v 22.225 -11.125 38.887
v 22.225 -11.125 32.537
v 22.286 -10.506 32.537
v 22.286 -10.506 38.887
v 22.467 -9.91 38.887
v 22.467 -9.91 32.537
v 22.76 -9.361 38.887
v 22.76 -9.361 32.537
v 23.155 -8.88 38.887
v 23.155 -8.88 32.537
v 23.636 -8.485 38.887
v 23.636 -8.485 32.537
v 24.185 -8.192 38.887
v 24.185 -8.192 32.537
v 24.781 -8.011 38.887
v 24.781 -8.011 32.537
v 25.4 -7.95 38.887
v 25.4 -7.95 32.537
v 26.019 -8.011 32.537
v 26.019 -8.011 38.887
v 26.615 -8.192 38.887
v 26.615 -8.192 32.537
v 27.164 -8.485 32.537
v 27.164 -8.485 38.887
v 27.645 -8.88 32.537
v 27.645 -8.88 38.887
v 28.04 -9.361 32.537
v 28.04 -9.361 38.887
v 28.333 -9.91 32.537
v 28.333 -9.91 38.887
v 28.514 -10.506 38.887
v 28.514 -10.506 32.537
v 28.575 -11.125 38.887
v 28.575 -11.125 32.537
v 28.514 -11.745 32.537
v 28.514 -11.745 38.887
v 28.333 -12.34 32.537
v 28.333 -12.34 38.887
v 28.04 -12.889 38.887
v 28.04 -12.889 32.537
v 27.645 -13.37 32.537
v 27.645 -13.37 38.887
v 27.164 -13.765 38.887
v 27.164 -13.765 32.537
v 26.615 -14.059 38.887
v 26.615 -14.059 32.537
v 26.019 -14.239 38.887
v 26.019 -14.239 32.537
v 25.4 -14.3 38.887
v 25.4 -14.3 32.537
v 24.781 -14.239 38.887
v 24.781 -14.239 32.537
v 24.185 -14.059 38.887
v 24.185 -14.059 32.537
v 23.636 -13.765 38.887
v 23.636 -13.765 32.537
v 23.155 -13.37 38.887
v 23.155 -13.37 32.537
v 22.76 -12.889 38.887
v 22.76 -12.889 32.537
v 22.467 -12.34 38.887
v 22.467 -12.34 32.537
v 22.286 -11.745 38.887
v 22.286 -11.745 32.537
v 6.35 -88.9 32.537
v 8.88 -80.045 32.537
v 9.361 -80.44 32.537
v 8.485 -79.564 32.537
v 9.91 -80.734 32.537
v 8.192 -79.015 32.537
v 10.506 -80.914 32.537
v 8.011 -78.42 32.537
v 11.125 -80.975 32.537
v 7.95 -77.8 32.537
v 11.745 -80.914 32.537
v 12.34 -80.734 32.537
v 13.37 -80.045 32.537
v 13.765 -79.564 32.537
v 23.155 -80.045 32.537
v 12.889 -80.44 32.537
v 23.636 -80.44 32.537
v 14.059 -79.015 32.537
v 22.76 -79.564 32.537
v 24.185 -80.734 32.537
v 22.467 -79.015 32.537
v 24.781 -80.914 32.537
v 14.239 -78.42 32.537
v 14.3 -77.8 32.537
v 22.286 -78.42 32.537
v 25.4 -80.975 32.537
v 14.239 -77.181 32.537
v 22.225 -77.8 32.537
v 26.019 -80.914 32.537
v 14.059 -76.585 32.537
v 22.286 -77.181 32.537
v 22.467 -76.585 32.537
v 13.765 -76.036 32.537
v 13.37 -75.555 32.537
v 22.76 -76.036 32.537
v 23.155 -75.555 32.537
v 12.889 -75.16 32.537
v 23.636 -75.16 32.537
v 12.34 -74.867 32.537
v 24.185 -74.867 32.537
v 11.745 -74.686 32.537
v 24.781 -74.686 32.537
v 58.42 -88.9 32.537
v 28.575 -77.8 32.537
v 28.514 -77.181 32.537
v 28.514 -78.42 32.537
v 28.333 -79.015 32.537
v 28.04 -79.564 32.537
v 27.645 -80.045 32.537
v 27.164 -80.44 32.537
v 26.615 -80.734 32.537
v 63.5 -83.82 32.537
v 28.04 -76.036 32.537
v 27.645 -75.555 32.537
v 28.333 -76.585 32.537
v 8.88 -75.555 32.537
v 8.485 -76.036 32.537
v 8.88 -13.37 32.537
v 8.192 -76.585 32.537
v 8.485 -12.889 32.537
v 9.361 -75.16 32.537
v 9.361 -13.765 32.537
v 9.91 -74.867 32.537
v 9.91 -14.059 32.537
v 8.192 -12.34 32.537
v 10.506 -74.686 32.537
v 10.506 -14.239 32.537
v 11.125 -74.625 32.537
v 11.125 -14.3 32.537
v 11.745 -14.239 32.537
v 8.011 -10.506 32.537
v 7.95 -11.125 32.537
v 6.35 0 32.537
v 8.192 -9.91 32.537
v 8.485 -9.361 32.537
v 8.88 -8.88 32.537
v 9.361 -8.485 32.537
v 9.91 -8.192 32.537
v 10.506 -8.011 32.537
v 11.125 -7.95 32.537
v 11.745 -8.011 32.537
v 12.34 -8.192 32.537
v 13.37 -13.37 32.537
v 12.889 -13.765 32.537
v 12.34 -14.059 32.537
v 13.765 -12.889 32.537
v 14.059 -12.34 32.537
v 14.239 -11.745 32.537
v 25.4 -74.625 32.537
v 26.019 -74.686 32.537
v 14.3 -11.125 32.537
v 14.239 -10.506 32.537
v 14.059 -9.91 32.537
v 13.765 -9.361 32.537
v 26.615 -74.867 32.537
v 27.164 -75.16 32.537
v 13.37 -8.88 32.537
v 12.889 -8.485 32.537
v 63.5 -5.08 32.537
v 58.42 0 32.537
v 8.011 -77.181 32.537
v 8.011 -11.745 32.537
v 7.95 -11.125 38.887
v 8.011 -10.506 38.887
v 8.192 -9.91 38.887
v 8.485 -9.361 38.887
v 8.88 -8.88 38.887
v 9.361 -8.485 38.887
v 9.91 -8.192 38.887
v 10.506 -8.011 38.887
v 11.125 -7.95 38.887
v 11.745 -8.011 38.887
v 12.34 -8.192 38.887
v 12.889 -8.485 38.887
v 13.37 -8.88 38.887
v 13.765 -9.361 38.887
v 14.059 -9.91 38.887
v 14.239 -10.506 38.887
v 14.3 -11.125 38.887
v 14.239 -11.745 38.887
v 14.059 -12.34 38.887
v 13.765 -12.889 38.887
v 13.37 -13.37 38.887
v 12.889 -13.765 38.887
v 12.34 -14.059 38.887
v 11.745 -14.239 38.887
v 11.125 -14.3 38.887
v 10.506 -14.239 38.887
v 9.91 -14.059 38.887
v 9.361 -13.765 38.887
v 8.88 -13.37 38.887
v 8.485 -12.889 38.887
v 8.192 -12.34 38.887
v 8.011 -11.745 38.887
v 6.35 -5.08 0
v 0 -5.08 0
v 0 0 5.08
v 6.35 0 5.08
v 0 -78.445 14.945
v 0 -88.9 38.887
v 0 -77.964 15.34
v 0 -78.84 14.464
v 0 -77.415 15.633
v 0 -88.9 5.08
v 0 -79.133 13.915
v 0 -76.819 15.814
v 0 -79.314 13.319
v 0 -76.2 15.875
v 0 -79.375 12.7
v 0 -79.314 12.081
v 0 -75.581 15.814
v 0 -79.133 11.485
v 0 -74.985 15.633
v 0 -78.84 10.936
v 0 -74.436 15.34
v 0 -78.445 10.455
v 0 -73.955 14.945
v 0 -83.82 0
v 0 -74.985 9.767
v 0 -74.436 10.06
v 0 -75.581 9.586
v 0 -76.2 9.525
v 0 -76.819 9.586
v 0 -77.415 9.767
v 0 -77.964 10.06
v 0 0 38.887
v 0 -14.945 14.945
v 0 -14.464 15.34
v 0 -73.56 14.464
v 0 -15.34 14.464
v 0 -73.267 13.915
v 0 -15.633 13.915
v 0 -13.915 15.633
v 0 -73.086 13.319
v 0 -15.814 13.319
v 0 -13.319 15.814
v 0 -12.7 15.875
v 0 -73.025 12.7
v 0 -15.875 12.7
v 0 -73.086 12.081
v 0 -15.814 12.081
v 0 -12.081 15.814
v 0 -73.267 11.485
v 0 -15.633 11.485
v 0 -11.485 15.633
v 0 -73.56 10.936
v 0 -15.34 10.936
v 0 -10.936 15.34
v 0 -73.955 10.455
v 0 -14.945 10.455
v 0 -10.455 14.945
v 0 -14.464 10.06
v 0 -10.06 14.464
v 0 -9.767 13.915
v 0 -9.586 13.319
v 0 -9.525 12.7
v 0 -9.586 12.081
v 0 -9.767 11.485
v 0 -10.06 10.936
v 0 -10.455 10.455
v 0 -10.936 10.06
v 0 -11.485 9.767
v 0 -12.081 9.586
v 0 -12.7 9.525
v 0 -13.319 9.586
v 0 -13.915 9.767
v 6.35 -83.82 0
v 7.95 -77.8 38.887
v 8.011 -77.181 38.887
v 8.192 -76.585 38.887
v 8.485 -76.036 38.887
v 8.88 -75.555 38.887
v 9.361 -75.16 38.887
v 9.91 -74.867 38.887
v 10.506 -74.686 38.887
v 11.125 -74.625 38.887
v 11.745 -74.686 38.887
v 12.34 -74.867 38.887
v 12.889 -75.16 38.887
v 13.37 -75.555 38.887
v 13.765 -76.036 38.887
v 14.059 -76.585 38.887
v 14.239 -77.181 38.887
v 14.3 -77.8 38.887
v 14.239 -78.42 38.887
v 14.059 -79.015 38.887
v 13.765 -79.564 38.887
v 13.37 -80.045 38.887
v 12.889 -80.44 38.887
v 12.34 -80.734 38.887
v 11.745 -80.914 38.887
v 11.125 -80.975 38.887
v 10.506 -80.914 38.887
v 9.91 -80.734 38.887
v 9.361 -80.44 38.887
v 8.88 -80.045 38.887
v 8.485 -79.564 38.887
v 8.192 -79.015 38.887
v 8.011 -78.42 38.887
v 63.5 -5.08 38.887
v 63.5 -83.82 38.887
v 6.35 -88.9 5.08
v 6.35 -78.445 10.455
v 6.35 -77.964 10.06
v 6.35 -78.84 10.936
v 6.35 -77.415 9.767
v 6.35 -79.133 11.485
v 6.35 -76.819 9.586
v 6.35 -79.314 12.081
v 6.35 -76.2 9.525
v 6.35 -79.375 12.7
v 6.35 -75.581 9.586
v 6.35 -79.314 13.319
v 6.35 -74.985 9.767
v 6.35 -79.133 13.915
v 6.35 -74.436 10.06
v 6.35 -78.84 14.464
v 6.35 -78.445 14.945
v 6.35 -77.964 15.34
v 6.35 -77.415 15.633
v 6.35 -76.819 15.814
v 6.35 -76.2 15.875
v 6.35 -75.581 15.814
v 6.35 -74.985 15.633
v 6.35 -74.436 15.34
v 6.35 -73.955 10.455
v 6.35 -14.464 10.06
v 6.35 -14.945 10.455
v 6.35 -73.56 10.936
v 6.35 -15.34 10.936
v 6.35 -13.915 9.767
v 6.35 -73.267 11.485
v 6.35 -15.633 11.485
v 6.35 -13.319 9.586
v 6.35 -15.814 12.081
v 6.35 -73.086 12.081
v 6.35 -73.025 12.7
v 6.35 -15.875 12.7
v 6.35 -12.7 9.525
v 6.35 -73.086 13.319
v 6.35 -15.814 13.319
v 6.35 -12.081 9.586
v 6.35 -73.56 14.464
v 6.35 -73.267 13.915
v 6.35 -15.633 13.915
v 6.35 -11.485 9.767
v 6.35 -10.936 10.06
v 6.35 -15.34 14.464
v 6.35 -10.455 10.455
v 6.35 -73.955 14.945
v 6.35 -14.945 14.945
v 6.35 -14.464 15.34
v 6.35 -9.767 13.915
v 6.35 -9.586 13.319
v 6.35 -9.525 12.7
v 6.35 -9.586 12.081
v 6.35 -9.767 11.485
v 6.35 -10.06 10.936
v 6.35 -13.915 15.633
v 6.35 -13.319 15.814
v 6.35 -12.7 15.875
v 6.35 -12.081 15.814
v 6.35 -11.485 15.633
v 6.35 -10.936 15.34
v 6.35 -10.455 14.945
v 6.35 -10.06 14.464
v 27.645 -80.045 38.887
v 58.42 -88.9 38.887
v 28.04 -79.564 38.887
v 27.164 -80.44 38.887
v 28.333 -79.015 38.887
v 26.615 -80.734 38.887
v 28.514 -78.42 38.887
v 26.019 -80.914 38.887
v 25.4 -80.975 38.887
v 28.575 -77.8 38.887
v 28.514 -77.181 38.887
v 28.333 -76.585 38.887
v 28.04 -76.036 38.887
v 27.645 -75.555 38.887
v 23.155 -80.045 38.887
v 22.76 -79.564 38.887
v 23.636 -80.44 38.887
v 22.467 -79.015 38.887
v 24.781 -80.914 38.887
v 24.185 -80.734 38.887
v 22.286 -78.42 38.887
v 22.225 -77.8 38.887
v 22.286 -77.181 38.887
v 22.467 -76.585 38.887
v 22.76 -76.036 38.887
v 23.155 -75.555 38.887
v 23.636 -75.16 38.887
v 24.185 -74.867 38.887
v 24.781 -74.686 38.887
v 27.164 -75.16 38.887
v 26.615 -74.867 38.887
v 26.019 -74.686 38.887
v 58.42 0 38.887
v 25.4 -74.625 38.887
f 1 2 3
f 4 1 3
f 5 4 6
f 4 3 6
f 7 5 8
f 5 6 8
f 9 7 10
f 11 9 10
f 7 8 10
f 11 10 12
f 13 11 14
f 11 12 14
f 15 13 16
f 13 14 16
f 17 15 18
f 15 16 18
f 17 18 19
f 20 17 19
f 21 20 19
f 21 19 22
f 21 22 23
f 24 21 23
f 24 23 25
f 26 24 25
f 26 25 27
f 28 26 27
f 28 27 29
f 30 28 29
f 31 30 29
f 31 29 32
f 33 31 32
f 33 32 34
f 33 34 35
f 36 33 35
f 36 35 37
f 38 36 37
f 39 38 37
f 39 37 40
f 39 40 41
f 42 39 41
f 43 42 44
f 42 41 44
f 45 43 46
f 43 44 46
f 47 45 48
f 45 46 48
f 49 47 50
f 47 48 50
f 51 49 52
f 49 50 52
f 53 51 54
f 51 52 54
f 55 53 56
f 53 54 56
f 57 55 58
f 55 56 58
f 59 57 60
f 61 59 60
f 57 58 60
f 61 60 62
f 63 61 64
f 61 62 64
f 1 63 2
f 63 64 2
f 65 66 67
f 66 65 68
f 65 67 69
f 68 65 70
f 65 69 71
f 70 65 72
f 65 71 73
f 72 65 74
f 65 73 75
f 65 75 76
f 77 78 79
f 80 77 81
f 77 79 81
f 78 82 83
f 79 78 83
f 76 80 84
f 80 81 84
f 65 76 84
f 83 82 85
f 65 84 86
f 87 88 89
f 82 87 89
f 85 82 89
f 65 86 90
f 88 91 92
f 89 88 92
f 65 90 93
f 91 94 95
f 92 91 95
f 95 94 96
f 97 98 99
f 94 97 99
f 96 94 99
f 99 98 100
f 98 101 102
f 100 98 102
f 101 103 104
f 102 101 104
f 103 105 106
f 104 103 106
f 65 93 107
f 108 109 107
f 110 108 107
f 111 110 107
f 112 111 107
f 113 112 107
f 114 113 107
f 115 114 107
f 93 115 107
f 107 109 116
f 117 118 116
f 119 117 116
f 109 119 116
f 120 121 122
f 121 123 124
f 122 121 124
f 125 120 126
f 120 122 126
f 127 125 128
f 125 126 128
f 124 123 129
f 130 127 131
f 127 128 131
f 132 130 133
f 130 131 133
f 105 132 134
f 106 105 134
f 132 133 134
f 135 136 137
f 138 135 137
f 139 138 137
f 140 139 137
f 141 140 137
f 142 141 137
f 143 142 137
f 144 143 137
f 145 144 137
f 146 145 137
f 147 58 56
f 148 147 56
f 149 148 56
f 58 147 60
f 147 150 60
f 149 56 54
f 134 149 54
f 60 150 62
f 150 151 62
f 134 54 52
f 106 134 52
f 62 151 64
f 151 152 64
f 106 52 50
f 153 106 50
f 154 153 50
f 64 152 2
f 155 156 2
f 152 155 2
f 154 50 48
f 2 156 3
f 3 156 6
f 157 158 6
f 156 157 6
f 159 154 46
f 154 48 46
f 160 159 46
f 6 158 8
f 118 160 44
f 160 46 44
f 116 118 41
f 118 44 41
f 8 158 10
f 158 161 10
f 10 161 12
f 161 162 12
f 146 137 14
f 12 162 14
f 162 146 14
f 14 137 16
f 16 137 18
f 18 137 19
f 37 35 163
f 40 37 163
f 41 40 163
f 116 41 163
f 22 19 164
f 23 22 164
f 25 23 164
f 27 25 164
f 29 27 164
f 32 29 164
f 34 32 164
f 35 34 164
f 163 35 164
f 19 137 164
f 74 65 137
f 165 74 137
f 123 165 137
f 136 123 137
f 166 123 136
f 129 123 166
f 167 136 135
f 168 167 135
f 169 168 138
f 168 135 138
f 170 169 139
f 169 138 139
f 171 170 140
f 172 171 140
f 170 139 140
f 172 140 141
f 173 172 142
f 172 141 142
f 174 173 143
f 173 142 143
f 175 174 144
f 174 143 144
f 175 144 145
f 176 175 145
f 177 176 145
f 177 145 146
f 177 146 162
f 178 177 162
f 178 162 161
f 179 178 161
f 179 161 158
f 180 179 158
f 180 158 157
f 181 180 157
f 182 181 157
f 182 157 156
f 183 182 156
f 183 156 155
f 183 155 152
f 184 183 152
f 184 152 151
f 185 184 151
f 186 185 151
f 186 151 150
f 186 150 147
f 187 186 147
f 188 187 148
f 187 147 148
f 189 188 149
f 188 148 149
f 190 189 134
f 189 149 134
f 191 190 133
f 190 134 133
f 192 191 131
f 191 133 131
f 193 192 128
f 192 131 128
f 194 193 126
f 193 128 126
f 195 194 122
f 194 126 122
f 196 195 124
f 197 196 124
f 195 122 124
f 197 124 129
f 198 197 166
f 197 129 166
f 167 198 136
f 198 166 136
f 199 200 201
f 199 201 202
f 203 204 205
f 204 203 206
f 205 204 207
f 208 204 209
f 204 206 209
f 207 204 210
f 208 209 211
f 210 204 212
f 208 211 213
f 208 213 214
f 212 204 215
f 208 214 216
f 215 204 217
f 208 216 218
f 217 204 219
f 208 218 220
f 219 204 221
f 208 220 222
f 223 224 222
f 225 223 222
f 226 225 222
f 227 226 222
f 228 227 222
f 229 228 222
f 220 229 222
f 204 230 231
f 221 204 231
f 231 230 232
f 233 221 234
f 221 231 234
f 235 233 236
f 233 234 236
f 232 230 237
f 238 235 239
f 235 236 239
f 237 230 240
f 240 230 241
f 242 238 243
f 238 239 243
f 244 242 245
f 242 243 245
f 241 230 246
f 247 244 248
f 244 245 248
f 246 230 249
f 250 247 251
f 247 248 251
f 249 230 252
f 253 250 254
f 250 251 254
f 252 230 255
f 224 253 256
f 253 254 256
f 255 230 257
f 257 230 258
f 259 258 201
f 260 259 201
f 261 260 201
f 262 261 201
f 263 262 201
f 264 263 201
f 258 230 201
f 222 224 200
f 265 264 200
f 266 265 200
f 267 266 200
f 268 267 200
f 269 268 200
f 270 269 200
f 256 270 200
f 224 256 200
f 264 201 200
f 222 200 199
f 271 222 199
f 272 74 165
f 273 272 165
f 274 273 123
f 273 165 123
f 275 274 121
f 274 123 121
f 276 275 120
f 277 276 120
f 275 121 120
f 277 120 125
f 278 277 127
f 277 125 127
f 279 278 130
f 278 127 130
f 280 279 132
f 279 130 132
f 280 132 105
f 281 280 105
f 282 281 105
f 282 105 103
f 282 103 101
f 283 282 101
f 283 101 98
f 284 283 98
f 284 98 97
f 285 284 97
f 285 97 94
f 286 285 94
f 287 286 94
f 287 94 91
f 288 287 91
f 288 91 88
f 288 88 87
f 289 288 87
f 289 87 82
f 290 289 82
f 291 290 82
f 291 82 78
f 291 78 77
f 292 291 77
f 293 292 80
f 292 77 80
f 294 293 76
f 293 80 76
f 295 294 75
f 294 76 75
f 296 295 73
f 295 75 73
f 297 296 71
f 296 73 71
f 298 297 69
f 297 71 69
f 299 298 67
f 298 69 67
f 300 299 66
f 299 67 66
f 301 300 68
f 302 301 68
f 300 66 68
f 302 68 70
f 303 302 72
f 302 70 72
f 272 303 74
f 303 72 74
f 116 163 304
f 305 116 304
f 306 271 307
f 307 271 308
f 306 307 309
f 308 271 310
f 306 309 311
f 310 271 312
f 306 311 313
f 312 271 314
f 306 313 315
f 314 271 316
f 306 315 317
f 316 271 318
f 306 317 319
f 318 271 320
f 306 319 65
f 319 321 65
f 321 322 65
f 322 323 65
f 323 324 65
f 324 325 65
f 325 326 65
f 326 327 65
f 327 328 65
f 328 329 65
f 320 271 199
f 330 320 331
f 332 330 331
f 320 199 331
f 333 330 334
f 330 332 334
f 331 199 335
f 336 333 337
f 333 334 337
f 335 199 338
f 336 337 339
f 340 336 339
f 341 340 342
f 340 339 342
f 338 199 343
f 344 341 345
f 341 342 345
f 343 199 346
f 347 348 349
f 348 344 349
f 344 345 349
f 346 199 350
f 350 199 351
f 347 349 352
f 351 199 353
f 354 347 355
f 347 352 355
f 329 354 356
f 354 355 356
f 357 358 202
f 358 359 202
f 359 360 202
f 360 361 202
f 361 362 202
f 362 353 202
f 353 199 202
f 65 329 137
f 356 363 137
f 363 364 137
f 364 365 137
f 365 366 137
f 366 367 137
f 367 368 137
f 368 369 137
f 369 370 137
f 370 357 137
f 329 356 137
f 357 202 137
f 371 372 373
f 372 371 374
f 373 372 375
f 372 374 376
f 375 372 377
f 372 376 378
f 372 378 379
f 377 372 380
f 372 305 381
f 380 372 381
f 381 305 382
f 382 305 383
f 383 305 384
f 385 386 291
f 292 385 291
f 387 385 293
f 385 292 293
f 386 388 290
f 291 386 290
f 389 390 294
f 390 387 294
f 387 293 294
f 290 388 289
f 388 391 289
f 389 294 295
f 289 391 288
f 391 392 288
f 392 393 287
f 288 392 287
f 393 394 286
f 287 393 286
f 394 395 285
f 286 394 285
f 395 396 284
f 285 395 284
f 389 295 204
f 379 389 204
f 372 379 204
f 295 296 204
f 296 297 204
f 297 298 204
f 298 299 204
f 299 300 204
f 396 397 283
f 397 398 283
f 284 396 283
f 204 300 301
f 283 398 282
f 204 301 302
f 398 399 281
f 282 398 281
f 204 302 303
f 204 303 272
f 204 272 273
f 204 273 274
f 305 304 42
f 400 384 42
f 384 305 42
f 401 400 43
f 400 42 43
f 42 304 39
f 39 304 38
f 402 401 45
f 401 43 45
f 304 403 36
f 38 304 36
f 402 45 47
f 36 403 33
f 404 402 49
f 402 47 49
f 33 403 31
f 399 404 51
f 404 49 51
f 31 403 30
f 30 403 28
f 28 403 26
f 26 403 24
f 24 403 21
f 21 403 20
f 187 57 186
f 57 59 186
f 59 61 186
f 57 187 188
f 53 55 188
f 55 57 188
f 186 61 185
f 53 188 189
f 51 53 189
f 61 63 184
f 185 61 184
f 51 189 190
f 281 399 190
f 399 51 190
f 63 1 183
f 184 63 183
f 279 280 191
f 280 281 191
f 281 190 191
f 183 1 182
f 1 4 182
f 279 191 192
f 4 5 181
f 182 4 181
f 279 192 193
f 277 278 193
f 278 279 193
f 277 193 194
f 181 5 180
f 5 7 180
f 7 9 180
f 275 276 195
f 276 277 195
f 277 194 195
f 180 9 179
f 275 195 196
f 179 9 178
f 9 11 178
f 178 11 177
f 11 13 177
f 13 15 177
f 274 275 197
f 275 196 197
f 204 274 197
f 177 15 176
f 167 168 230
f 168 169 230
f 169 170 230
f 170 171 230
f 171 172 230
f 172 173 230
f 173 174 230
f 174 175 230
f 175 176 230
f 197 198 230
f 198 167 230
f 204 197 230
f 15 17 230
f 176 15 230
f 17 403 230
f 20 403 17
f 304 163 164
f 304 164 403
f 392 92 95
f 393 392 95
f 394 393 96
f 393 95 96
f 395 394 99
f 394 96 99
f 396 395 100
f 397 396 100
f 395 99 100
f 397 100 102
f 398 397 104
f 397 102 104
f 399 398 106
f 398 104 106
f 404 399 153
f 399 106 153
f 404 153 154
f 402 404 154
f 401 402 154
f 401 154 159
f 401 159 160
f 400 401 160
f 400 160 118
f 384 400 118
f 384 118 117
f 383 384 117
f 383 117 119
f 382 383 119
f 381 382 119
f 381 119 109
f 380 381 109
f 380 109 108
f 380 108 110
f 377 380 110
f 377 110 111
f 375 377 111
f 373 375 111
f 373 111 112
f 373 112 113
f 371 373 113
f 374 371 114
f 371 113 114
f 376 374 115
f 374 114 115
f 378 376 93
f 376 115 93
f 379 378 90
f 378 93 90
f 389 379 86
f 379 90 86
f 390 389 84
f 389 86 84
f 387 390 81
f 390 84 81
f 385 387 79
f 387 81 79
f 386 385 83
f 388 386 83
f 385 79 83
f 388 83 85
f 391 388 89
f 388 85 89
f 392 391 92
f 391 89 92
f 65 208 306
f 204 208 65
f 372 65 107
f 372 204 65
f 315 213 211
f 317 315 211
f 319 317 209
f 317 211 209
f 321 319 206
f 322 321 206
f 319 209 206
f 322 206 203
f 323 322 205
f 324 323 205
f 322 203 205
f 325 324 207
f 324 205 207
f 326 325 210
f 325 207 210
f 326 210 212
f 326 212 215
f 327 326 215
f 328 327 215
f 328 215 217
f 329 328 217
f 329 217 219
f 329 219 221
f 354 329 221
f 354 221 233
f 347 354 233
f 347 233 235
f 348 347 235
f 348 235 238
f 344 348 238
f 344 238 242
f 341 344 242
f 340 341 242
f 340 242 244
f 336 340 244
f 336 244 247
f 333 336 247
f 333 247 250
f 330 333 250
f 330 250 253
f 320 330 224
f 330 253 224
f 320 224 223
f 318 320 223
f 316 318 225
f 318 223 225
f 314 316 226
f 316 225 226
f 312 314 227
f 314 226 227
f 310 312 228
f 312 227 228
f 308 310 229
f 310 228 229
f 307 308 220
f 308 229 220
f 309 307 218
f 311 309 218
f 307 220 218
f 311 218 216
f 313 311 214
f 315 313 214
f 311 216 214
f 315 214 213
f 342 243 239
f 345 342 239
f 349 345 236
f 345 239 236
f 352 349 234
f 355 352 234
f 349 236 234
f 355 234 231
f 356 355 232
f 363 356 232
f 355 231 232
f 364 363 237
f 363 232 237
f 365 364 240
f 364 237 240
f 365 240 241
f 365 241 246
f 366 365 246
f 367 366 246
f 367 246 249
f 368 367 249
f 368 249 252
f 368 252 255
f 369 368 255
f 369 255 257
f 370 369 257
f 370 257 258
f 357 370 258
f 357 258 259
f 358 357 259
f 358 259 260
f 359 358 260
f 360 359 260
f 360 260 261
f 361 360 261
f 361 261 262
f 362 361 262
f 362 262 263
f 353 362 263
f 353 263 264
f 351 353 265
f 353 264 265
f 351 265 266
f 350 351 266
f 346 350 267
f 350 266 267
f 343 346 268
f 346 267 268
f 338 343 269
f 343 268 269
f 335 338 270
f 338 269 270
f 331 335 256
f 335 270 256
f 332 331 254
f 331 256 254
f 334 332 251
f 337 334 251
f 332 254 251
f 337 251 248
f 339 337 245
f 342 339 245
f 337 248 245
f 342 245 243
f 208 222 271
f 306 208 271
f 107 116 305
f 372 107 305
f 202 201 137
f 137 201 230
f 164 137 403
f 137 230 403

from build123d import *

# Parameters (mm, degrees)
F1_DEPTH = 88.9
F3_D     = 6.35
F4_SIZE  = 5.08
F6_D     = 6.35


with BuildPart() as f1:
    # F0 (on Front) → F1 (new body)
    with BuildSketch(Plane.XZ):
        Polygon((0, 38.8874), (0, 0), (6.35, 0), (6.35, 32.5374), (63.5, 32.5374), (63.5, 38.8874), align=None)
    extrude(amount=F1_DEPTH)

    # F3 (through all)
    with Locations(Plane.YZ.offset(6.35)):
        with Locations((-76.2, 12.7), (-12.7, 12.7)):
            Hole(F3_D / 2)

    # F4
    f4_edges = [f1.edges().sort_by_distance(p)[0] for p in [
        (3.175, -88.9, 0),
        (63.5, -88.9, 35.7124),
        (63.5, 0, 35.7124),
        (3.175, 0, 0),
    ]]
    chamfer(f4_edges, length=F4_SIZE)

    # F6 (through all)
    with Locations(Plane.XY.offset(38.8874)):
        with Locations((25.4, -11.1252), (11.1252, -11.1252), (11.1252, -77.8002), (25.4, -77.8002)):
            Hole(F6_D / 2)


solid = f1.part
